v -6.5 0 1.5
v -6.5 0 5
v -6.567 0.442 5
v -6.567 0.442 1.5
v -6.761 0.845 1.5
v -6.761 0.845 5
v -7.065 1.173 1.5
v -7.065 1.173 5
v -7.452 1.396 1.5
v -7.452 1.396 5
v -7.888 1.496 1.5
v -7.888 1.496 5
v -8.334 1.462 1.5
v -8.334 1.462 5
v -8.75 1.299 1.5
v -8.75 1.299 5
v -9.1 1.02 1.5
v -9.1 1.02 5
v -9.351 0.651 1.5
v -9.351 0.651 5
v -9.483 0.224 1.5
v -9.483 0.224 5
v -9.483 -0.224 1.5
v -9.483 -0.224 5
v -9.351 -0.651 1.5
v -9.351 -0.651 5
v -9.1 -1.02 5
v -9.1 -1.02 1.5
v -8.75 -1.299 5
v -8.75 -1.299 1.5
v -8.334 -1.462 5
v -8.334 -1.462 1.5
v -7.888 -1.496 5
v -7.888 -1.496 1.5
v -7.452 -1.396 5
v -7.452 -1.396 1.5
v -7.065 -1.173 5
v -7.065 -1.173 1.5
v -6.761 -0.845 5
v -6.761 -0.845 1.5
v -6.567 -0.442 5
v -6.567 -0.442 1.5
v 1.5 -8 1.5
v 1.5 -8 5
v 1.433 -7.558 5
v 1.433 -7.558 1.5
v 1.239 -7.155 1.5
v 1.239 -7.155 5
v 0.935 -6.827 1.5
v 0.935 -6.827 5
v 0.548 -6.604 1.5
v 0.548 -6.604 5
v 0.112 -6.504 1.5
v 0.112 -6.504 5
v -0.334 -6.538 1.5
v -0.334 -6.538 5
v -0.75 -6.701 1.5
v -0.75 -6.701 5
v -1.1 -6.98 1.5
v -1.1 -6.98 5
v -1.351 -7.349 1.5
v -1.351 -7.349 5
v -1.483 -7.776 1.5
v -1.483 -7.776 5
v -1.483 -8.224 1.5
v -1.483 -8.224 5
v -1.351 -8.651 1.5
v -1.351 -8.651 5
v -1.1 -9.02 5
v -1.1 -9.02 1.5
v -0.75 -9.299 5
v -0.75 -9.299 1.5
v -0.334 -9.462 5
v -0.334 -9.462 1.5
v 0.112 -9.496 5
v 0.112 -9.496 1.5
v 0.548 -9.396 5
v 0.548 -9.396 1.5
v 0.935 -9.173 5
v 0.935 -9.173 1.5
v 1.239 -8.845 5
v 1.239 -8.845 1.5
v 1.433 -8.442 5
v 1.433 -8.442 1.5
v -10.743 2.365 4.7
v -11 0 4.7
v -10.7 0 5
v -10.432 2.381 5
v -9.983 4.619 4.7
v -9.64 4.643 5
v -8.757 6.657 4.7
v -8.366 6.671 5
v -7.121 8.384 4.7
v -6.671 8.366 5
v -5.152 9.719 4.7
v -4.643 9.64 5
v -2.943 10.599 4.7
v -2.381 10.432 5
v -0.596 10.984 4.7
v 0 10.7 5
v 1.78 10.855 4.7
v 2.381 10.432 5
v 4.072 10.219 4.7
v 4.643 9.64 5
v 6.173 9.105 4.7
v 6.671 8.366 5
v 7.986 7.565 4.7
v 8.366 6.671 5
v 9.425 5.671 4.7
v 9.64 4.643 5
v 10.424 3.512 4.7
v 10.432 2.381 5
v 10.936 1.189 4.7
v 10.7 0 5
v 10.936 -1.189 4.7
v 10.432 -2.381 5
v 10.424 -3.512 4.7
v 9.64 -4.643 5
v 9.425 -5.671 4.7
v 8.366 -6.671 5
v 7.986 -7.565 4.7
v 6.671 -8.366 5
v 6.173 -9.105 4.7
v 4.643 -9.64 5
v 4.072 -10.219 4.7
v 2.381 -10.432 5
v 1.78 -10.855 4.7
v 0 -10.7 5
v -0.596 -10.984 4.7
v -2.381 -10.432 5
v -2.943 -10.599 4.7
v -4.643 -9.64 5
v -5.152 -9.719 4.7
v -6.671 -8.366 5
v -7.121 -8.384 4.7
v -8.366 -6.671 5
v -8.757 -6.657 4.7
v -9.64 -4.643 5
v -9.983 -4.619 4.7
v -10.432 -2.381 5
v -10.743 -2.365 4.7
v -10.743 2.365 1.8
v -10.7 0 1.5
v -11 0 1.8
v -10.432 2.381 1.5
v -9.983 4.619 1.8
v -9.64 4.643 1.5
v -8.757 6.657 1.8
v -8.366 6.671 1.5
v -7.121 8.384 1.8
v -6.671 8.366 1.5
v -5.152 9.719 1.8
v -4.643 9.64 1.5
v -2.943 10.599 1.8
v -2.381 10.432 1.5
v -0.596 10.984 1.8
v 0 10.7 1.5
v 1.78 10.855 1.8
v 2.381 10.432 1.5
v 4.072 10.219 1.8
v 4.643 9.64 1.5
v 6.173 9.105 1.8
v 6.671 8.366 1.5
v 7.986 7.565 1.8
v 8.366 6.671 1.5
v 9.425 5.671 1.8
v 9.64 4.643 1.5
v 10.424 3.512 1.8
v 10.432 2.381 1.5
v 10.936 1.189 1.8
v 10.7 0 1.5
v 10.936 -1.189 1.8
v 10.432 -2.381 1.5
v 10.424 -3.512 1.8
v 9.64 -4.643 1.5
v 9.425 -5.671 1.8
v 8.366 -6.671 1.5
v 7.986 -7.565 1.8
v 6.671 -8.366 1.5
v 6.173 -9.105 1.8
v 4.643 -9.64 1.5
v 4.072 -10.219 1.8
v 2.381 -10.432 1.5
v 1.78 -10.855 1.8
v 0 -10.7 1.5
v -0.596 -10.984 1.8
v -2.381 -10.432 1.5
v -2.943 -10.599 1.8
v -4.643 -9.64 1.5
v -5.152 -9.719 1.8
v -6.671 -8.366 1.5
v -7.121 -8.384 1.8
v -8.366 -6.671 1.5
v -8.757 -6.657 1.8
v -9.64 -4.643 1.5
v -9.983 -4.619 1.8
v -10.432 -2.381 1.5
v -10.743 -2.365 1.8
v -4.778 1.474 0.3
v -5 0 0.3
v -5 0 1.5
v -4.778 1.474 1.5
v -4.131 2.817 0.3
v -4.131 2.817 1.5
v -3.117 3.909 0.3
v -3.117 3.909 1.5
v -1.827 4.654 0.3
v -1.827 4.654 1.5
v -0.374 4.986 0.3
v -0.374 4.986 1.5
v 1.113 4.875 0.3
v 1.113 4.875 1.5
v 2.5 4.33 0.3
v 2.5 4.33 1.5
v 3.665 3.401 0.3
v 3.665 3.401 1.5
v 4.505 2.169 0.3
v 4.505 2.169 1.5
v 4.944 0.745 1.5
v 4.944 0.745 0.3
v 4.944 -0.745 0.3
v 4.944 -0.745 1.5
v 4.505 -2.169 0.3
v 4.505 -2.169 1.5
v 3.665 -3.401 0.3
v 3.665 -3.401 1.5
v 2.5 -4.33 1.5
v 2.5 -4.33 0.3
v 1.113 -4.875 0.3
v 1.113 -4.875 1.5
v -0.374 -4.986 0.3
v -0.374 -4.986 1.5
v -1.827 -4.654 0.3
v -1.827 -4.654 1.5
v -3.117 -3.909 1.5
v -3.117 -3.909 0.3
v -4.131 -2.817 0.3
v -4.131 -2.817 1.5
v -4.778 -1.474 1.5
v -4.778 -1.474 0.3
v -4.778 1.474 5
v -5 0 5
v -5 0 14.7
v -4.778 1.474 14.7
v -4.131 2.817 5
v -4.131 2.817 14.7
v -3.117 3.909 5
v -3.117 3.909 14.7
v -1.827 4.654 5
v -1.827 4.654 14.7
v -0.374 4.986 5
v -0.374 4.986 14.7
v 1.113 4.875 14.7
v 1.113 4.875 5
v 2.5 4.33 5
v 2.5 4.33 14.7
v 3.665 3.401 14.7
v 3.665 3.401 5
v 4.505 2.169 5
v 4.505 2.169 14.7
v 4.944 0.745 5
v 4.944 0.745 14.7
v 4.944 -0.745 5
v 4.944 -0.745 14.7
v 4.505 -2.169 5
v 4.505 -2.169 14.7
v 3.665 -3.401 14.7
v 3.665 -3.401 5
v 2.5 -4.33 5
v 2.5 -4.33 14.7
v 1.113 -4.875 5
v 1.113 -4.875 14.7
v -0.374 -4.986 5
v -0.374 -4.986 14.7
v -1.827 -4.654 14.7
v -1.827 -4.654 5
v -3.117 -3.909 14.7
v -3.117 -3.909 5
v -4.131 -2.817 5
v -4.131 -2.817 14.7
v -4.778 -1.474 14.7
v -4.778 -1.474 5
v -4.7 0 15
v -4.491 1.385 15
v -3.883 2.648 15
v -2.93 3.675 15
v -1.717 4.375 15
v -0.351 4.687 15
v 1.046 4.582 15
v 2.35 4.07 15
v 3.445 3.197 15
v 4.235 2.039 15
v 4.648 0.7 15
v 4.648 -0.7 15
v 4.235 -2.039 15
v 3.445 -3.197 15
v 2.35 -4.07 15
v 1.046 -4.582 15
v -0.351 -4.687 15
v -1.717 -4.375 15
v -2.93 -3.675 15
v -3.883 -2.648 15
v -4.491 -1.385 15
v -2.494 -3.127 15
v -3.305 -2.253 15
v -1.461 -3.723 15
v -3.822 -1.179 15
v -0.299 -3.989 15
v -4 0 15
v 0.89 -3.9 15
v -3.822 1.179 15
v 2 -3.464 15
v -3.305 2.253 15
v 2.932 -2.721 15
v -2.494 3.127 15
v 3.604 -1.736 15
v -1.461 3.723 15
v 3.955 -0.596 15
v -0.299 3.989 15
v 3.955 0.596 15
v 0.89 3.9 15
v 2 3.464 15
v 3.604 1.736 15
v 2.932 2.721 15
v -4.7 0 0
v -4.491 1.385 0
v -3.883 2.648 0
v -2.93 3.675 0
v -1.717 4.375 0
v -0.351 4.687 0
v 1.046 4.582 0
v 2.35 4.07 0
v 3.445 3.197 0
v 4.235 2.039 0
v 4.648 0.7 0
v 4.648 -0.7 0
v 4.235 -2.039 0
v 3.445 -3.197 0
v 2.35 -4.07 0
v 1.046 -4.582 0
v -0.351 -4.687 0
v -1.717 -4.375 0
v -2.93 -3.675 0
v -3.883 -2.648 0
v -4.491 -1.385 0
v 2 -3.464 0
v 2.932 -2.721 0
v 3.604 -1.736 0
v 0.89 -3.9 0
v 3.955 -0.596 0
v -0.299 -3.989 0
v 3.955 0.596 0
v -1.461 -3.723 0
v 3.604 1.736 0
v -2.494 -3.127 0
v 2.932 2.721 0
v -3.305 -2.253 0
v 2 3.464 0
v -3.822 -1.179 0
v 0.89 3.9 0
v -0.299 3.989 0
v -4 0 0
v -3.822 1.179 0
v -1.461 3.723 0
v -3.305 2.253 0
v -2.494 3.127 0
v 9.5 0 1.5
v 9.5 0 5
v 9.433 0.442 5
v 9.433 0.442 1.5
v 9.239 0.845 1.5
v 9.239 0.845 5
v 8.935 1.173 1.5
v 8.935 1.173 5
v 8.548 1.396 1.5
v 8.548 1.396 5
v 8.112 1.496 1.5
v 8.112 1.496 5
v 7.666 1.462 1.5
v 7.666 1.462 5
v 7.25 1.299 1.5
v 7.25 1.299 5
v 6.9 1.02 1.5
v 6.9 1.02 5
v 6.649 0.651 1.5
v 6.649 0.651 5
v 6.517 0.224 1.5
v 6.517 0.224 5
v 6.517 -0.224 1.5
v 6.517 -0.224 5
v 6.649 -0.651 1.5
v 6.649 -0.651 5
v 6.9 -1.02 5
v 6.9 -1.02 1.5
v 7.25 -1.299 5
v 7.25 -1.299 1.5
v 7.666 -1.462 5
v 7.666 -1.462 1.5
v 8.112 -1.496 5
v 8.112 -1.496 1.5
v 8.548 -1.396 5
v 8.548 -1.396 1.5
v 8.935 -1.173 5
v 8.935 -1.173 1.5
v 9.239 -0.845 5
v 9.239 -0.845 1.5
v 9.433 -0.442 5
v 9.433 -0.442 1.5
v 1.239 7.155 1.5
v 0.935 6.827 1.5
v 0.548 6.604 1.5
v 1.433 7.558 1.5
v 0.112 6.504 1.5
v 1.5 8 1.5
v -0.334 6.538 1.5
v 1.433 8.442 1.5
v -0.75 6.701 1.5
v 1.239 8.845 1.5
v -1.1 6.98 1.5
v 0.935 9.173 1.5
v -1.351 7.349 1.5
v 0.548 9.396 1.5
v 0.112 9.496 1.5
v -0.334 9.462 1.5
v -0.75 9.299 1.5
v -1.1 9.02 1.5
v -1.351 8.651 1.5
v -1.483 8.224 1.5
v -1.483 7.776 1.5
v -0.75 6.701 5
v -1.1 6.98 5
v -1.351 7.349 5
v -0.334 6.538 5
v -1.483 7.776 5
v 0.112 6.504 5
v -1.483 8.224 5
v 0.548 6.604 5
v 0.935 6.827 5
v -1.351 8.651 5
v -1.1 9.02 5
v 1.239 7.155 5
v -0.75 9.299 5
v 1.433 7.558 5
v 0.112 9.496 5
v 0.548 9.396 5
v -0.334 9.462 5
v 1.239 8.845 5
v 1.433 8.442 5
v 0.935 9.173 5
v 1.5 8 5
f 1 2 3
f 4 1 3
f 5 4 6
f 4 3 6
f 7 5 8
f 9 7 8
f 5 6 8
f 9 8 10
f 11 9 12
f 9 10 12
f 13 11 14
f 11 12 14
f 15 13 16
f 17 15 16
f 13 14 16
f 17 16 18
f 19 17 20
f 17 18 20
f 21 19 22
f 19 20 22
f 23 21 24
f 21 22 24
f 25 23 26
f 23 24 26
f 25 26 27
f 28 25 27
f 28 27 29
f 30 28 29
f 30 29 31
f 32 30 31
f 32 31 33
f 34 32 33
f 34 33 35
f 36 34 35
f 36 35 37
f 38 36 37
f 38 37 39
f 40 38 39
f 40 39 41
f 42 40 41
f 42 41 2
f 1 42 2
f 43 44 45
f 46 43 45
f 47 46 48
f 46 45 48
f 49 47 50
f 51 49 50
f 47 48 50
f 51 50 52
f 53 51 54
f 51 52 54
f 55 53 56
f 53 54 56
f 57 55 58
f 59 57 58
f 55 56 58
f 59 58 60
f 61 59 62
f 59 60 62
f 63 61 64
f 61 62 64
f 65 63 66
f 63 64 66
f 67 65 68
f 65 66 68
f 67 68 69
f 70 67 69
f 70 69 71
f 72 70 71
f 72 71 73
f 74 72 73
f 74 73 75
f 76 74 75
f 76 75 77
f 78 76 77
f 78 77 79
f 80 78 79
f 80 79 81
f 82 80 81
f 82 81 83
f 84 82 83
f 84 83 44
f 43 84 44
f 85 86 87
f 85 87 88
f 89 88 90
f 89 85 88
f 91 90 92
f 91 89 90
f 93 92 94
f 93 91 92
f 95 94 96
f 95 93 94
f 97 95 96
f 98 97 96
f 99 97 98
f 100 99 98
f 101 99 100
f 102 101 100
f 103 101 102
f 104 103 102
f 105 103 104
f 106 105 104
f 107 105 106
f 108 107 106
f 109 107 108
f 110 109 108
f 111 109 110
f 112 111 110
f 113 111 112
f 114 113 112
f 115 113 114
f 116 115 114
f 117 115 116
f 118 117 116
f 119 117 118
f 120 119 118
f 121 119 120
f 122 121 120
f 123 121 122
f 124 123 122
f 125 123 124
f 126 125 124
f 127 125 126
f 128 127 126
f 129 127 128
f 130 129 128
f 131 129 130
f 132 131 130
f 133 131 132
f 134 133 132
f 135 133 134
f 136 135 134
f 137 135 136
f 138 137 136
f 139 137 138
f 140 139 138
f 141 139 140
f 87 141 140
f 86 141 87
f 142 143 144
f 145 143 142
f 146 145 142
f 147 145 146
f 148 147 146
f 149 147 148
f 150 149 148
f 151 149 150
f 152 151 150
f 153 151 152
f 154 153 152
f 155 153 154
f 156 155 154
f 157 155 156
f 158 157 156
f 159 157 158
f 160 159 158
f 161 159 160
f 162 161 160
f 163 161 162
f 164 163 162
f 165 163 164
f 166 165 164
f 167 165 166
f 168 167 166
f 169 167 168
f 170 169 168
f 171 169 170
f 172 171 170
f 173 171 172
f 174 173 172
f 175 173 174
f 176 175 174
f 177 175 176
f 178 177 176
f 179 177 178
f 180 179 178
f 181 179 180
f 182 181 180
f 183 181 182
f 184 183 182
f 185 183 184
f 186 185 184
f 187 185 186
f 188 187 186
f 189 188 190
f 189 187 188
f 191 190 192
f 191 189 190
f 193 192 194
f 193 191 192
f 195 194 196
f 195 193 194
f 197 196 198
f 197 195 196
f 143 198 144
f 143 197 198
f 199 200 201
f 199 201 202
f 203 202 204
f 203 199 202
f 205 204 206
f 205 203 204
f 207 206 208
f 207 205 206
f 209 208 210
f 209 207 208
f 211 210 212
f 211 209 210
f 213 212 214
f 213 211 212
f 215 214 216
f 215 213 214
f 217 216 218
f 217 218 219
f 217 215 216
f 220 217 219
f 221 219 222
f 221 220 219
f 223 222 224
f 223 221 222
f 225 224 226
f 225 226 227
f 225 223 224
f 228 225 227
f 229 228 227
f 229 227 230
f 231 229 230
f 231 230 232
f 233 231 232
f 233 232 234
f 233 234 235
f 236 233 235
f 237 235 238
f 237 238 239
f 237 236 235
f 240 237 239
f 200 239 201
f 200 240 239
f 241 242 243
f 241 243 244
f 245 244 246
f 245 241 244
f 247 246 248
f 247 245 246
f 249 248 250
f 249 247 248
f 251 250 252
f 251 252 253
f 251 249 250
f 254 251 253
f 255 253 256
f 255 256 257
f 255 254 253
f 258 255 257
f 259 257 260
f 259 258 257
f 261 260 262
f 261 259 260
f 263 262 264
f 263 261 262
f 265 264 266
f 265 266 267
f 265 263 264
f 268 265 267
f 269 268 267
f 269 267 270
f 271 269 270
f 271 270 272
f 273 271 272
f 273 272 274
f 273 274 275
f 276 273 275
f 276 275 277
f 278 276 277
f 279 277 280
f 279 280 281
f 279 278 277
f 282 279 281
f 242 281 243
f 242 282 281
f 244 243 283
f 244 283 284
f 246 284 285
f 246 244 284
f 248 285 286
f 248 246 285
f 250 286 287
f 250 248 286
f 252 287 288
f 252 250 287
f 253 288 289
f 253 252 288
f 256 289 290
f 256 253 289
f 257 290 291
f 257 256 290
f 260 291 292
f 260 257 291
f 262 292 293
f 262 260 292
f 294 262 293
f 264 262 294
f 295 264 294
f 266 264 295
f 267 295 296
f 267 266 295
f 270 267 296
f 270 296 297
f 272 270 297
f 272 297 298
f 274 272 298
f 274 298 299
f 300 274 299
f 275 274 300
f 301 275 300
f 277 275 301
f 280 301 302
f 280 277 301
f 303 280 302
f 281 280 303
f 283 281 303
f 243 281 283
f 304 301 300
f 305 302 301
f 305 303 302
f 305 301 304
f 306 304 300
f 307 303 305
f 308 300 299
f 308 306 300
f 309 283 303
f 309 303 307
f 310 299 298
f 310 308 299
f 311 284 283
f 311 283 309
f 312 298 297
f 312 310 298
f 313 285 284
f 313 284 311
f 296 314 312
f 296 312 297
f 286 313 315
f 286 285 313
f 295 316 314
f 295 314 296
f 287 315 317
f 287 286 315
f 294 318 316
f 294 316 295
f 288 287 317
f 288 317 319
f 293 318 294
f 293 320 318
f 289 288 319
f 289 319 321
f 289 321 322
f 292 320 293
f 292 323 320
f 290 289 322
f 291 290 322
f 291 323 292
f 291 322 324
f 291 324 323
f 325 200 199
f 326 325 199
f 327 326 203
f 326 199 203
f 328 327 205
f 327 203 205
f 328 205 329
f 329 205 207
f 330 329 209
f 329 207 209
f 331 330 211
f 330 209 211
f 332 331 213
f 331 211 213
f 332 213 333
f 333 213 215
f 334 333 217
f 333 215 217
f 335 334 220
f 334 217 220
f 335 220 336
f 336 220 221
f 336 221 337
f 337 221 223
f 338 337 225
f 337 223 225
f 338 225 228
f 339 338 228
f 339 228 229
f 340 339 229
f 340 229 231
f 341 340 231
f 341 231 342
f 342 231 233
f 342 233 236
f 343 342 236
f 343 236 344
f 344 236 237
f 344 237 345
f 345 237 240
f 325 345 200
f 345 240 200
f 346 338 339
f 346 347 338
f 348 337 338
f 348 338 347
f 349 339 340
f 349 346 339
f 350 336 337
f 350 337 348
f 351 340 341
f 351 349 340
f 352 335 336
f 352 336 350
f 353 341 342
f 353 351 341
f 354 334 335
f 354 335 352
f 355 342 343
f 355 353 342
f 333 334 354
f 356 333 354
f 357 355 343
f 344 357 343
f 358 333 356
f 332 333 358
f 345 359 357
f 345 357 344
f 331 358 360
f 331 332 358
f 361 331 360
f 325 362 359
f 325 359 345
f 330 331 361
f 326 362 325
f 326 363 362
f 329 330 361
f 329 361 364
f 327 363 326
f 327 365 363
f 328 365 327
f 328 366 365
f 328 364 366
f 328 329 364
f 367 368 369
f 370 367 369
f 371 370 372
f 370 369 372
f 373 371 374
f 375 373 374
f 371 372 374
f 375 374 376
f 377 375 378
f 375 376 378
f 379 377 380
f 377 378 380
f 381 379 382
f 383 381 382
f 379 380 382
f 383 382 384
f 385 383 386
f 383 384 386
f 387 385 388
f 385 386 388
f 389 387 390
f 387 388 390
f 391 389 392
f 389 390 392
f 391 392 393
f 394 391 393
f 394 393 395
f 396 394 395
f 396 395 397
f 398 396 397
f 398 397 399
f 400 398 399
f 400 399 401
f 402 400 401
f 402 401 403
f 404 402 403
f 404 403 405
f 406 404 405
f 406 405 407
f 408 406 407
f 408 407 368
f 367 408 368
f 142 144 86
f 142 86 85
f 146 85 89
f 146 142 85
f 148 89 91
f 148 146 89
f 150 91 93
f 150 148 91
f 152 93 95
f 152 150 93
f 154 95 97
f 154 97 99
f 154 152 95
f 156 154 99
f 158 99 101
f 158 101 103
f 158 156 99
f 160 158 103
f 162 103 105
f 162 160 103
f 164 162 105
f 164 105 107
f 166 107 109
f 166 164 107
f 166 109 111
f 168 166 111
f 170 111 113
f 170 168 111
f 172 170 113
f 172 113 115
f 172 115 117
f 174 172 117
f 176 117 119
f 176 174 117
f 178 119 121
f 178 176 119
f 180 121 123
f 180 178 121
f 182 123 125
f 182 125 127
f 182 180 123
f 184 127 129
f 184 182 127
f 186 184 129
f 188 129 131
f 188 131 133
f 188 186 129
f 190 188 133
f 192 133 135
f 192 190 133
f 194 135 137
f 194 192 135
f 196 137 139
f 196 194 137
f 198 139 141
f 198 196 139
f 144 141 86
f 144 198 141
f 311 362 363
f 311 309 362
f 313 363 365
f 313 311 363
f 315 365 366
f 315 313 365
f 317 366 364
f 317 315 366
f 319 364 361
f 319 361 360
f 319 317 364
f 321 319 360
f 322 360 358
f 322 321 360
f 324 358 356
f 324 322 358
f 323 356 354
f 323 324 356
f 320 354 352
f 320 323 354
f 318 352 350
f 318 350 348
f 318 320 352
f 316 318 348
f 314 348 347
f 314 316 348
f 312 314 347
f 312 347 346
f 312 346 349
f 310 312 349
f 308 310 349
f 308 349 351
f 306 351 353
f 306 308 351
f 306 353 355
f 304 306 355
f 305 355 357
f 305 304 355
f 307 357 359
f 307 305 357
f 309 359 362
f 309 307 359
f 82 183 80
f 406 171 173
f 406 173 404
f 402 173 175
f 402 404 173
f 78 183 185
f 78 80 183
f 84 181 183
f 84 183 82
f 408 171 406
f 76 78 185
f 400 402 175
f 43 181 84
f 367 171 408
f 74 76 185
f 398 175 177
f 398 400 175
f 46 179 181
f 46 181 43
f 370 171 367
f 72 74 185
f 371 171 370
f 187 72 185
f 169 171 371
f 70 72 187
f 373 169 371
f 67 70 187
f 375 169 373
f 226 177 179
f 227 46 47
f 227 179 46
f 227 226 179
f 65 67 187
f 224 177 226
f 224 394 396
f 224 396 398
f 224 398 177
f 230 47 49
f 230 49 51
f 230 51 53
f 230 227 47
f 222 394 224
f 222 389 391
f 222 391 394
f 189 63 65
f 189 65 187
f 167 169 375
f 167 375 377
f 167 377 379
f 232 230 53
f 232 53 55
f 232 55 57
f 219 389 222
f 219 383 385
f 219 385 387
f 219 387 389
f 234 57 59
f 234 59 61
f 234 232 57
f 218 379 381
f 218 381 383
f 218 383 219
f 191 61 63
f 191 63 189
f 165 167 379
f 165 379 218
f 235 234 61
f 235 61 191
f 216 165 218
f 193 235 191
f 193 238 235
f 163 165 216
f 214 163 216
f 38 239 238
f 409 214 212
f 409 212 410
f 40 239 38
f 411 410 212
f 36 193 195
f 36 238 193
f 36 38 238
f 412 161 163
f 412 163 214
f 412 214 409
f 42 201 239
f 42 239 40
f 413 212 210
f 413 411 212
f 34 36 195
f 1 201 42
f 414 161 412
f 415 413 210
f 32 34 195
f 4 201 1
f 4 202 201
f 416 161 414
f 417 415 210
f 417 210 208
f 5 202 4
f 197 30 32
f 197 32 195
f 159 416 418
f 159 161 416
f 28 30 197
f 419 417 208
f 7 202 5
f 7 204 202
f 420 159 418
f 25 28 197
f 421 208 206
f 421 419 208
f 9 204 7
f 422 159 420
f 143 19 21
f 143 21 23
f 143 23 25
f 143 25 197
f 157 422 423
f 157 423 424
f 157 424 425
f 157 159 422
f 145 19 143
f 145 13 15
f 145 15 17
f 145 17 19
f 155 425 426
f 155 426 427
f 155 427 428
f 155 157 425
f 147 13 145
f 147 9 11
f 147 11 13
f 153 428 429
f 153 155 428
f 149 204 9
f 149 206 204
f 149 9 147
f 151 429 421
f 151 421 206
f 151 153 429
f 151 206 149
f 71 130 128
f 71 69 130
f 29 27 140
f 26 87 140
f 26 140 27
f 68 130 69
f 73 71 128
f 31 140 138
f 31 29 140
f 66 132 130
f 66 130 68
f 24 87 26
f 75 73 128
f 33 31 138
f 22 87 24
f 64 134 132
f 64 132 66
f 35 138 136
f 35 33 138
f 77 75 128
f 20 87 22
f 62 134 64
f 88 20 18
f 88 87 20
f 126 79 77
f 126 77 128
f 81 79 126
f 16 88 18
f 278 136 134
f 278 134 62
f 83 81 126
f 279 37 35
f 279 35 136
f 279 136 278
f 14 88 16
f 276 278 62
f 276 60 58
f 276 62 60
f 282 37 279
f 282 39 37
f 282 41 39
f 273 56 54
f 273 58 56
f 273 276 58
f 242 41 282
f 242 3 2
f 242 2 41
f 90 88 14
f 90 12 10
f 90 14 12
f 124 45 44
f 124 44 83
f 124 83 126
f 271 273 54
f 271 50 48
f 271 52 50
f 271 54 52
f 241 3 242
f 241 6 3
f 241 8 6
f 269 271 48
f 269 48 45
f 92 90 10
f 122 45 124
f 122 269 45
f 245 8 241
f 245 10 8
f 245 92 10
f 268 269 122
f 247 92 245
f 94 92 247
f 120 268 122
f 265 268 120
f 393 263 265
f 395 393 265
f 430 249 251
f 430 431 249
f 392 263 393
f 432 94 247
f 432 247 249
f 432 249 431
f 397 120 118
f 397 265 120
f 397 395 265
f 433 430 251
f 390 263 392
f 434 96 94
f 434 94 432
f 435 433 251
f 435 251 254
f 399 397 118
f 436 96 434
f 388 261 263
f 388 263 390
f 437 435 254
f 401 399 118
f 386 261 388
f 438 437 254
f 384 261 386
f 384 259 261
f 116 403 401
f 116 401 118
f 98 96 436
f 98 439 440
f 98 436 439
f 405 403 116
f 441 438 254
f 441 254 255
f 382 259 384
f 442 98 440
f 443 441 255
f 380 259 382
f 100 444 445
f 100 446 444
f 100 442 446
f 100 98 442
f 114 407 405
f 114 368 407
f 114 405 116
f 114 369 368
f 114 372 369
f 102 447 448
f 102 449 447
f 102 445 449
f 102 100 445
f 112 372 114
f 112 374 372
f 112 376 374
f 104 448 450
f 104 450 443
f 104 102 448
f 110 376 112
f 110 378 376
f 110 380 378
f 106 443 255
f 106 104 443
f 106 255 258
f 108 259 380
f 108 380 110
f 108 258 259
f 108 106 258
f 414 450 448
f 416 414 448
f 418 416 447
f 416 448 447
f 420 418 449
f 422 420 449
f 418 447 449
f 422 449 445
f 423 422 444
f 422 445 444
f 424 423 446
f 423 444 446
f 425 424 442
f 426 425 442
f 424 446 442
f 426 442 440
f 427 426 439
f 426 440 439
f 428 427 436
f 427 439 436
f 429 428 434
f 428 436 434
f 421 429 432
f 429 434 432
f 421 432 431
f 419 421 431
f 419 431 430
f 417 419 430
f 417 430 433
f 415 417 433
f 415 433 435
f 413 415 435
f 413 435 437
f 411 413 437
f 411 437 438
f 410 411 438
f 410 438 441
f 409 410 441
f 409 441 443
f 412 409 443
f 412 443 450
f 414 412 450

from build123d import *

# Parameters (mm, degrees)
F2_SIZE  = 0.3
F3_R     = 1.5
F4_DEPTH = 25


with BuildPart() as f1:
    # F0 (on Front) → F1 (revolve)
    with BuildSketch(Plane.XZ):
        Polygon((-5, 0), (-4, 0), (-4, 15), (-5, 15), (-5, 5), (-11, 5), (-11, 1.5), (-5, 1.5), align=None)
    revolve(axis=Axis((0, 0, -3.111579), (0, 0, -1)))

    # F2
    f2_edges = [f1.edges().sort_by_distance(p)[0] for p in [
        (11, 0, 5),
        (5, 0, 15),
        (11, 0, 1.5),
        (5, 0, 0),
    ]]
    chamfer(f2_edges, length=F2_SIZE)

    # F3 (on face) → F4 (cut)
    with BuildSketch(Plane.XY.offset(5)):
        with Locations((0, 8)):
            Circle(F3_R)
        with Locations((-8, 0)):
            Circle(F3_R)
        with Locations((0, -8)):
            Circle(F3_R)
        with Locations((8, 0)):
            Circle(F3_R)
    extrude(amount=-F4_DEPTH, mode=Mode.SUBTRACT)


solid = f1.part
